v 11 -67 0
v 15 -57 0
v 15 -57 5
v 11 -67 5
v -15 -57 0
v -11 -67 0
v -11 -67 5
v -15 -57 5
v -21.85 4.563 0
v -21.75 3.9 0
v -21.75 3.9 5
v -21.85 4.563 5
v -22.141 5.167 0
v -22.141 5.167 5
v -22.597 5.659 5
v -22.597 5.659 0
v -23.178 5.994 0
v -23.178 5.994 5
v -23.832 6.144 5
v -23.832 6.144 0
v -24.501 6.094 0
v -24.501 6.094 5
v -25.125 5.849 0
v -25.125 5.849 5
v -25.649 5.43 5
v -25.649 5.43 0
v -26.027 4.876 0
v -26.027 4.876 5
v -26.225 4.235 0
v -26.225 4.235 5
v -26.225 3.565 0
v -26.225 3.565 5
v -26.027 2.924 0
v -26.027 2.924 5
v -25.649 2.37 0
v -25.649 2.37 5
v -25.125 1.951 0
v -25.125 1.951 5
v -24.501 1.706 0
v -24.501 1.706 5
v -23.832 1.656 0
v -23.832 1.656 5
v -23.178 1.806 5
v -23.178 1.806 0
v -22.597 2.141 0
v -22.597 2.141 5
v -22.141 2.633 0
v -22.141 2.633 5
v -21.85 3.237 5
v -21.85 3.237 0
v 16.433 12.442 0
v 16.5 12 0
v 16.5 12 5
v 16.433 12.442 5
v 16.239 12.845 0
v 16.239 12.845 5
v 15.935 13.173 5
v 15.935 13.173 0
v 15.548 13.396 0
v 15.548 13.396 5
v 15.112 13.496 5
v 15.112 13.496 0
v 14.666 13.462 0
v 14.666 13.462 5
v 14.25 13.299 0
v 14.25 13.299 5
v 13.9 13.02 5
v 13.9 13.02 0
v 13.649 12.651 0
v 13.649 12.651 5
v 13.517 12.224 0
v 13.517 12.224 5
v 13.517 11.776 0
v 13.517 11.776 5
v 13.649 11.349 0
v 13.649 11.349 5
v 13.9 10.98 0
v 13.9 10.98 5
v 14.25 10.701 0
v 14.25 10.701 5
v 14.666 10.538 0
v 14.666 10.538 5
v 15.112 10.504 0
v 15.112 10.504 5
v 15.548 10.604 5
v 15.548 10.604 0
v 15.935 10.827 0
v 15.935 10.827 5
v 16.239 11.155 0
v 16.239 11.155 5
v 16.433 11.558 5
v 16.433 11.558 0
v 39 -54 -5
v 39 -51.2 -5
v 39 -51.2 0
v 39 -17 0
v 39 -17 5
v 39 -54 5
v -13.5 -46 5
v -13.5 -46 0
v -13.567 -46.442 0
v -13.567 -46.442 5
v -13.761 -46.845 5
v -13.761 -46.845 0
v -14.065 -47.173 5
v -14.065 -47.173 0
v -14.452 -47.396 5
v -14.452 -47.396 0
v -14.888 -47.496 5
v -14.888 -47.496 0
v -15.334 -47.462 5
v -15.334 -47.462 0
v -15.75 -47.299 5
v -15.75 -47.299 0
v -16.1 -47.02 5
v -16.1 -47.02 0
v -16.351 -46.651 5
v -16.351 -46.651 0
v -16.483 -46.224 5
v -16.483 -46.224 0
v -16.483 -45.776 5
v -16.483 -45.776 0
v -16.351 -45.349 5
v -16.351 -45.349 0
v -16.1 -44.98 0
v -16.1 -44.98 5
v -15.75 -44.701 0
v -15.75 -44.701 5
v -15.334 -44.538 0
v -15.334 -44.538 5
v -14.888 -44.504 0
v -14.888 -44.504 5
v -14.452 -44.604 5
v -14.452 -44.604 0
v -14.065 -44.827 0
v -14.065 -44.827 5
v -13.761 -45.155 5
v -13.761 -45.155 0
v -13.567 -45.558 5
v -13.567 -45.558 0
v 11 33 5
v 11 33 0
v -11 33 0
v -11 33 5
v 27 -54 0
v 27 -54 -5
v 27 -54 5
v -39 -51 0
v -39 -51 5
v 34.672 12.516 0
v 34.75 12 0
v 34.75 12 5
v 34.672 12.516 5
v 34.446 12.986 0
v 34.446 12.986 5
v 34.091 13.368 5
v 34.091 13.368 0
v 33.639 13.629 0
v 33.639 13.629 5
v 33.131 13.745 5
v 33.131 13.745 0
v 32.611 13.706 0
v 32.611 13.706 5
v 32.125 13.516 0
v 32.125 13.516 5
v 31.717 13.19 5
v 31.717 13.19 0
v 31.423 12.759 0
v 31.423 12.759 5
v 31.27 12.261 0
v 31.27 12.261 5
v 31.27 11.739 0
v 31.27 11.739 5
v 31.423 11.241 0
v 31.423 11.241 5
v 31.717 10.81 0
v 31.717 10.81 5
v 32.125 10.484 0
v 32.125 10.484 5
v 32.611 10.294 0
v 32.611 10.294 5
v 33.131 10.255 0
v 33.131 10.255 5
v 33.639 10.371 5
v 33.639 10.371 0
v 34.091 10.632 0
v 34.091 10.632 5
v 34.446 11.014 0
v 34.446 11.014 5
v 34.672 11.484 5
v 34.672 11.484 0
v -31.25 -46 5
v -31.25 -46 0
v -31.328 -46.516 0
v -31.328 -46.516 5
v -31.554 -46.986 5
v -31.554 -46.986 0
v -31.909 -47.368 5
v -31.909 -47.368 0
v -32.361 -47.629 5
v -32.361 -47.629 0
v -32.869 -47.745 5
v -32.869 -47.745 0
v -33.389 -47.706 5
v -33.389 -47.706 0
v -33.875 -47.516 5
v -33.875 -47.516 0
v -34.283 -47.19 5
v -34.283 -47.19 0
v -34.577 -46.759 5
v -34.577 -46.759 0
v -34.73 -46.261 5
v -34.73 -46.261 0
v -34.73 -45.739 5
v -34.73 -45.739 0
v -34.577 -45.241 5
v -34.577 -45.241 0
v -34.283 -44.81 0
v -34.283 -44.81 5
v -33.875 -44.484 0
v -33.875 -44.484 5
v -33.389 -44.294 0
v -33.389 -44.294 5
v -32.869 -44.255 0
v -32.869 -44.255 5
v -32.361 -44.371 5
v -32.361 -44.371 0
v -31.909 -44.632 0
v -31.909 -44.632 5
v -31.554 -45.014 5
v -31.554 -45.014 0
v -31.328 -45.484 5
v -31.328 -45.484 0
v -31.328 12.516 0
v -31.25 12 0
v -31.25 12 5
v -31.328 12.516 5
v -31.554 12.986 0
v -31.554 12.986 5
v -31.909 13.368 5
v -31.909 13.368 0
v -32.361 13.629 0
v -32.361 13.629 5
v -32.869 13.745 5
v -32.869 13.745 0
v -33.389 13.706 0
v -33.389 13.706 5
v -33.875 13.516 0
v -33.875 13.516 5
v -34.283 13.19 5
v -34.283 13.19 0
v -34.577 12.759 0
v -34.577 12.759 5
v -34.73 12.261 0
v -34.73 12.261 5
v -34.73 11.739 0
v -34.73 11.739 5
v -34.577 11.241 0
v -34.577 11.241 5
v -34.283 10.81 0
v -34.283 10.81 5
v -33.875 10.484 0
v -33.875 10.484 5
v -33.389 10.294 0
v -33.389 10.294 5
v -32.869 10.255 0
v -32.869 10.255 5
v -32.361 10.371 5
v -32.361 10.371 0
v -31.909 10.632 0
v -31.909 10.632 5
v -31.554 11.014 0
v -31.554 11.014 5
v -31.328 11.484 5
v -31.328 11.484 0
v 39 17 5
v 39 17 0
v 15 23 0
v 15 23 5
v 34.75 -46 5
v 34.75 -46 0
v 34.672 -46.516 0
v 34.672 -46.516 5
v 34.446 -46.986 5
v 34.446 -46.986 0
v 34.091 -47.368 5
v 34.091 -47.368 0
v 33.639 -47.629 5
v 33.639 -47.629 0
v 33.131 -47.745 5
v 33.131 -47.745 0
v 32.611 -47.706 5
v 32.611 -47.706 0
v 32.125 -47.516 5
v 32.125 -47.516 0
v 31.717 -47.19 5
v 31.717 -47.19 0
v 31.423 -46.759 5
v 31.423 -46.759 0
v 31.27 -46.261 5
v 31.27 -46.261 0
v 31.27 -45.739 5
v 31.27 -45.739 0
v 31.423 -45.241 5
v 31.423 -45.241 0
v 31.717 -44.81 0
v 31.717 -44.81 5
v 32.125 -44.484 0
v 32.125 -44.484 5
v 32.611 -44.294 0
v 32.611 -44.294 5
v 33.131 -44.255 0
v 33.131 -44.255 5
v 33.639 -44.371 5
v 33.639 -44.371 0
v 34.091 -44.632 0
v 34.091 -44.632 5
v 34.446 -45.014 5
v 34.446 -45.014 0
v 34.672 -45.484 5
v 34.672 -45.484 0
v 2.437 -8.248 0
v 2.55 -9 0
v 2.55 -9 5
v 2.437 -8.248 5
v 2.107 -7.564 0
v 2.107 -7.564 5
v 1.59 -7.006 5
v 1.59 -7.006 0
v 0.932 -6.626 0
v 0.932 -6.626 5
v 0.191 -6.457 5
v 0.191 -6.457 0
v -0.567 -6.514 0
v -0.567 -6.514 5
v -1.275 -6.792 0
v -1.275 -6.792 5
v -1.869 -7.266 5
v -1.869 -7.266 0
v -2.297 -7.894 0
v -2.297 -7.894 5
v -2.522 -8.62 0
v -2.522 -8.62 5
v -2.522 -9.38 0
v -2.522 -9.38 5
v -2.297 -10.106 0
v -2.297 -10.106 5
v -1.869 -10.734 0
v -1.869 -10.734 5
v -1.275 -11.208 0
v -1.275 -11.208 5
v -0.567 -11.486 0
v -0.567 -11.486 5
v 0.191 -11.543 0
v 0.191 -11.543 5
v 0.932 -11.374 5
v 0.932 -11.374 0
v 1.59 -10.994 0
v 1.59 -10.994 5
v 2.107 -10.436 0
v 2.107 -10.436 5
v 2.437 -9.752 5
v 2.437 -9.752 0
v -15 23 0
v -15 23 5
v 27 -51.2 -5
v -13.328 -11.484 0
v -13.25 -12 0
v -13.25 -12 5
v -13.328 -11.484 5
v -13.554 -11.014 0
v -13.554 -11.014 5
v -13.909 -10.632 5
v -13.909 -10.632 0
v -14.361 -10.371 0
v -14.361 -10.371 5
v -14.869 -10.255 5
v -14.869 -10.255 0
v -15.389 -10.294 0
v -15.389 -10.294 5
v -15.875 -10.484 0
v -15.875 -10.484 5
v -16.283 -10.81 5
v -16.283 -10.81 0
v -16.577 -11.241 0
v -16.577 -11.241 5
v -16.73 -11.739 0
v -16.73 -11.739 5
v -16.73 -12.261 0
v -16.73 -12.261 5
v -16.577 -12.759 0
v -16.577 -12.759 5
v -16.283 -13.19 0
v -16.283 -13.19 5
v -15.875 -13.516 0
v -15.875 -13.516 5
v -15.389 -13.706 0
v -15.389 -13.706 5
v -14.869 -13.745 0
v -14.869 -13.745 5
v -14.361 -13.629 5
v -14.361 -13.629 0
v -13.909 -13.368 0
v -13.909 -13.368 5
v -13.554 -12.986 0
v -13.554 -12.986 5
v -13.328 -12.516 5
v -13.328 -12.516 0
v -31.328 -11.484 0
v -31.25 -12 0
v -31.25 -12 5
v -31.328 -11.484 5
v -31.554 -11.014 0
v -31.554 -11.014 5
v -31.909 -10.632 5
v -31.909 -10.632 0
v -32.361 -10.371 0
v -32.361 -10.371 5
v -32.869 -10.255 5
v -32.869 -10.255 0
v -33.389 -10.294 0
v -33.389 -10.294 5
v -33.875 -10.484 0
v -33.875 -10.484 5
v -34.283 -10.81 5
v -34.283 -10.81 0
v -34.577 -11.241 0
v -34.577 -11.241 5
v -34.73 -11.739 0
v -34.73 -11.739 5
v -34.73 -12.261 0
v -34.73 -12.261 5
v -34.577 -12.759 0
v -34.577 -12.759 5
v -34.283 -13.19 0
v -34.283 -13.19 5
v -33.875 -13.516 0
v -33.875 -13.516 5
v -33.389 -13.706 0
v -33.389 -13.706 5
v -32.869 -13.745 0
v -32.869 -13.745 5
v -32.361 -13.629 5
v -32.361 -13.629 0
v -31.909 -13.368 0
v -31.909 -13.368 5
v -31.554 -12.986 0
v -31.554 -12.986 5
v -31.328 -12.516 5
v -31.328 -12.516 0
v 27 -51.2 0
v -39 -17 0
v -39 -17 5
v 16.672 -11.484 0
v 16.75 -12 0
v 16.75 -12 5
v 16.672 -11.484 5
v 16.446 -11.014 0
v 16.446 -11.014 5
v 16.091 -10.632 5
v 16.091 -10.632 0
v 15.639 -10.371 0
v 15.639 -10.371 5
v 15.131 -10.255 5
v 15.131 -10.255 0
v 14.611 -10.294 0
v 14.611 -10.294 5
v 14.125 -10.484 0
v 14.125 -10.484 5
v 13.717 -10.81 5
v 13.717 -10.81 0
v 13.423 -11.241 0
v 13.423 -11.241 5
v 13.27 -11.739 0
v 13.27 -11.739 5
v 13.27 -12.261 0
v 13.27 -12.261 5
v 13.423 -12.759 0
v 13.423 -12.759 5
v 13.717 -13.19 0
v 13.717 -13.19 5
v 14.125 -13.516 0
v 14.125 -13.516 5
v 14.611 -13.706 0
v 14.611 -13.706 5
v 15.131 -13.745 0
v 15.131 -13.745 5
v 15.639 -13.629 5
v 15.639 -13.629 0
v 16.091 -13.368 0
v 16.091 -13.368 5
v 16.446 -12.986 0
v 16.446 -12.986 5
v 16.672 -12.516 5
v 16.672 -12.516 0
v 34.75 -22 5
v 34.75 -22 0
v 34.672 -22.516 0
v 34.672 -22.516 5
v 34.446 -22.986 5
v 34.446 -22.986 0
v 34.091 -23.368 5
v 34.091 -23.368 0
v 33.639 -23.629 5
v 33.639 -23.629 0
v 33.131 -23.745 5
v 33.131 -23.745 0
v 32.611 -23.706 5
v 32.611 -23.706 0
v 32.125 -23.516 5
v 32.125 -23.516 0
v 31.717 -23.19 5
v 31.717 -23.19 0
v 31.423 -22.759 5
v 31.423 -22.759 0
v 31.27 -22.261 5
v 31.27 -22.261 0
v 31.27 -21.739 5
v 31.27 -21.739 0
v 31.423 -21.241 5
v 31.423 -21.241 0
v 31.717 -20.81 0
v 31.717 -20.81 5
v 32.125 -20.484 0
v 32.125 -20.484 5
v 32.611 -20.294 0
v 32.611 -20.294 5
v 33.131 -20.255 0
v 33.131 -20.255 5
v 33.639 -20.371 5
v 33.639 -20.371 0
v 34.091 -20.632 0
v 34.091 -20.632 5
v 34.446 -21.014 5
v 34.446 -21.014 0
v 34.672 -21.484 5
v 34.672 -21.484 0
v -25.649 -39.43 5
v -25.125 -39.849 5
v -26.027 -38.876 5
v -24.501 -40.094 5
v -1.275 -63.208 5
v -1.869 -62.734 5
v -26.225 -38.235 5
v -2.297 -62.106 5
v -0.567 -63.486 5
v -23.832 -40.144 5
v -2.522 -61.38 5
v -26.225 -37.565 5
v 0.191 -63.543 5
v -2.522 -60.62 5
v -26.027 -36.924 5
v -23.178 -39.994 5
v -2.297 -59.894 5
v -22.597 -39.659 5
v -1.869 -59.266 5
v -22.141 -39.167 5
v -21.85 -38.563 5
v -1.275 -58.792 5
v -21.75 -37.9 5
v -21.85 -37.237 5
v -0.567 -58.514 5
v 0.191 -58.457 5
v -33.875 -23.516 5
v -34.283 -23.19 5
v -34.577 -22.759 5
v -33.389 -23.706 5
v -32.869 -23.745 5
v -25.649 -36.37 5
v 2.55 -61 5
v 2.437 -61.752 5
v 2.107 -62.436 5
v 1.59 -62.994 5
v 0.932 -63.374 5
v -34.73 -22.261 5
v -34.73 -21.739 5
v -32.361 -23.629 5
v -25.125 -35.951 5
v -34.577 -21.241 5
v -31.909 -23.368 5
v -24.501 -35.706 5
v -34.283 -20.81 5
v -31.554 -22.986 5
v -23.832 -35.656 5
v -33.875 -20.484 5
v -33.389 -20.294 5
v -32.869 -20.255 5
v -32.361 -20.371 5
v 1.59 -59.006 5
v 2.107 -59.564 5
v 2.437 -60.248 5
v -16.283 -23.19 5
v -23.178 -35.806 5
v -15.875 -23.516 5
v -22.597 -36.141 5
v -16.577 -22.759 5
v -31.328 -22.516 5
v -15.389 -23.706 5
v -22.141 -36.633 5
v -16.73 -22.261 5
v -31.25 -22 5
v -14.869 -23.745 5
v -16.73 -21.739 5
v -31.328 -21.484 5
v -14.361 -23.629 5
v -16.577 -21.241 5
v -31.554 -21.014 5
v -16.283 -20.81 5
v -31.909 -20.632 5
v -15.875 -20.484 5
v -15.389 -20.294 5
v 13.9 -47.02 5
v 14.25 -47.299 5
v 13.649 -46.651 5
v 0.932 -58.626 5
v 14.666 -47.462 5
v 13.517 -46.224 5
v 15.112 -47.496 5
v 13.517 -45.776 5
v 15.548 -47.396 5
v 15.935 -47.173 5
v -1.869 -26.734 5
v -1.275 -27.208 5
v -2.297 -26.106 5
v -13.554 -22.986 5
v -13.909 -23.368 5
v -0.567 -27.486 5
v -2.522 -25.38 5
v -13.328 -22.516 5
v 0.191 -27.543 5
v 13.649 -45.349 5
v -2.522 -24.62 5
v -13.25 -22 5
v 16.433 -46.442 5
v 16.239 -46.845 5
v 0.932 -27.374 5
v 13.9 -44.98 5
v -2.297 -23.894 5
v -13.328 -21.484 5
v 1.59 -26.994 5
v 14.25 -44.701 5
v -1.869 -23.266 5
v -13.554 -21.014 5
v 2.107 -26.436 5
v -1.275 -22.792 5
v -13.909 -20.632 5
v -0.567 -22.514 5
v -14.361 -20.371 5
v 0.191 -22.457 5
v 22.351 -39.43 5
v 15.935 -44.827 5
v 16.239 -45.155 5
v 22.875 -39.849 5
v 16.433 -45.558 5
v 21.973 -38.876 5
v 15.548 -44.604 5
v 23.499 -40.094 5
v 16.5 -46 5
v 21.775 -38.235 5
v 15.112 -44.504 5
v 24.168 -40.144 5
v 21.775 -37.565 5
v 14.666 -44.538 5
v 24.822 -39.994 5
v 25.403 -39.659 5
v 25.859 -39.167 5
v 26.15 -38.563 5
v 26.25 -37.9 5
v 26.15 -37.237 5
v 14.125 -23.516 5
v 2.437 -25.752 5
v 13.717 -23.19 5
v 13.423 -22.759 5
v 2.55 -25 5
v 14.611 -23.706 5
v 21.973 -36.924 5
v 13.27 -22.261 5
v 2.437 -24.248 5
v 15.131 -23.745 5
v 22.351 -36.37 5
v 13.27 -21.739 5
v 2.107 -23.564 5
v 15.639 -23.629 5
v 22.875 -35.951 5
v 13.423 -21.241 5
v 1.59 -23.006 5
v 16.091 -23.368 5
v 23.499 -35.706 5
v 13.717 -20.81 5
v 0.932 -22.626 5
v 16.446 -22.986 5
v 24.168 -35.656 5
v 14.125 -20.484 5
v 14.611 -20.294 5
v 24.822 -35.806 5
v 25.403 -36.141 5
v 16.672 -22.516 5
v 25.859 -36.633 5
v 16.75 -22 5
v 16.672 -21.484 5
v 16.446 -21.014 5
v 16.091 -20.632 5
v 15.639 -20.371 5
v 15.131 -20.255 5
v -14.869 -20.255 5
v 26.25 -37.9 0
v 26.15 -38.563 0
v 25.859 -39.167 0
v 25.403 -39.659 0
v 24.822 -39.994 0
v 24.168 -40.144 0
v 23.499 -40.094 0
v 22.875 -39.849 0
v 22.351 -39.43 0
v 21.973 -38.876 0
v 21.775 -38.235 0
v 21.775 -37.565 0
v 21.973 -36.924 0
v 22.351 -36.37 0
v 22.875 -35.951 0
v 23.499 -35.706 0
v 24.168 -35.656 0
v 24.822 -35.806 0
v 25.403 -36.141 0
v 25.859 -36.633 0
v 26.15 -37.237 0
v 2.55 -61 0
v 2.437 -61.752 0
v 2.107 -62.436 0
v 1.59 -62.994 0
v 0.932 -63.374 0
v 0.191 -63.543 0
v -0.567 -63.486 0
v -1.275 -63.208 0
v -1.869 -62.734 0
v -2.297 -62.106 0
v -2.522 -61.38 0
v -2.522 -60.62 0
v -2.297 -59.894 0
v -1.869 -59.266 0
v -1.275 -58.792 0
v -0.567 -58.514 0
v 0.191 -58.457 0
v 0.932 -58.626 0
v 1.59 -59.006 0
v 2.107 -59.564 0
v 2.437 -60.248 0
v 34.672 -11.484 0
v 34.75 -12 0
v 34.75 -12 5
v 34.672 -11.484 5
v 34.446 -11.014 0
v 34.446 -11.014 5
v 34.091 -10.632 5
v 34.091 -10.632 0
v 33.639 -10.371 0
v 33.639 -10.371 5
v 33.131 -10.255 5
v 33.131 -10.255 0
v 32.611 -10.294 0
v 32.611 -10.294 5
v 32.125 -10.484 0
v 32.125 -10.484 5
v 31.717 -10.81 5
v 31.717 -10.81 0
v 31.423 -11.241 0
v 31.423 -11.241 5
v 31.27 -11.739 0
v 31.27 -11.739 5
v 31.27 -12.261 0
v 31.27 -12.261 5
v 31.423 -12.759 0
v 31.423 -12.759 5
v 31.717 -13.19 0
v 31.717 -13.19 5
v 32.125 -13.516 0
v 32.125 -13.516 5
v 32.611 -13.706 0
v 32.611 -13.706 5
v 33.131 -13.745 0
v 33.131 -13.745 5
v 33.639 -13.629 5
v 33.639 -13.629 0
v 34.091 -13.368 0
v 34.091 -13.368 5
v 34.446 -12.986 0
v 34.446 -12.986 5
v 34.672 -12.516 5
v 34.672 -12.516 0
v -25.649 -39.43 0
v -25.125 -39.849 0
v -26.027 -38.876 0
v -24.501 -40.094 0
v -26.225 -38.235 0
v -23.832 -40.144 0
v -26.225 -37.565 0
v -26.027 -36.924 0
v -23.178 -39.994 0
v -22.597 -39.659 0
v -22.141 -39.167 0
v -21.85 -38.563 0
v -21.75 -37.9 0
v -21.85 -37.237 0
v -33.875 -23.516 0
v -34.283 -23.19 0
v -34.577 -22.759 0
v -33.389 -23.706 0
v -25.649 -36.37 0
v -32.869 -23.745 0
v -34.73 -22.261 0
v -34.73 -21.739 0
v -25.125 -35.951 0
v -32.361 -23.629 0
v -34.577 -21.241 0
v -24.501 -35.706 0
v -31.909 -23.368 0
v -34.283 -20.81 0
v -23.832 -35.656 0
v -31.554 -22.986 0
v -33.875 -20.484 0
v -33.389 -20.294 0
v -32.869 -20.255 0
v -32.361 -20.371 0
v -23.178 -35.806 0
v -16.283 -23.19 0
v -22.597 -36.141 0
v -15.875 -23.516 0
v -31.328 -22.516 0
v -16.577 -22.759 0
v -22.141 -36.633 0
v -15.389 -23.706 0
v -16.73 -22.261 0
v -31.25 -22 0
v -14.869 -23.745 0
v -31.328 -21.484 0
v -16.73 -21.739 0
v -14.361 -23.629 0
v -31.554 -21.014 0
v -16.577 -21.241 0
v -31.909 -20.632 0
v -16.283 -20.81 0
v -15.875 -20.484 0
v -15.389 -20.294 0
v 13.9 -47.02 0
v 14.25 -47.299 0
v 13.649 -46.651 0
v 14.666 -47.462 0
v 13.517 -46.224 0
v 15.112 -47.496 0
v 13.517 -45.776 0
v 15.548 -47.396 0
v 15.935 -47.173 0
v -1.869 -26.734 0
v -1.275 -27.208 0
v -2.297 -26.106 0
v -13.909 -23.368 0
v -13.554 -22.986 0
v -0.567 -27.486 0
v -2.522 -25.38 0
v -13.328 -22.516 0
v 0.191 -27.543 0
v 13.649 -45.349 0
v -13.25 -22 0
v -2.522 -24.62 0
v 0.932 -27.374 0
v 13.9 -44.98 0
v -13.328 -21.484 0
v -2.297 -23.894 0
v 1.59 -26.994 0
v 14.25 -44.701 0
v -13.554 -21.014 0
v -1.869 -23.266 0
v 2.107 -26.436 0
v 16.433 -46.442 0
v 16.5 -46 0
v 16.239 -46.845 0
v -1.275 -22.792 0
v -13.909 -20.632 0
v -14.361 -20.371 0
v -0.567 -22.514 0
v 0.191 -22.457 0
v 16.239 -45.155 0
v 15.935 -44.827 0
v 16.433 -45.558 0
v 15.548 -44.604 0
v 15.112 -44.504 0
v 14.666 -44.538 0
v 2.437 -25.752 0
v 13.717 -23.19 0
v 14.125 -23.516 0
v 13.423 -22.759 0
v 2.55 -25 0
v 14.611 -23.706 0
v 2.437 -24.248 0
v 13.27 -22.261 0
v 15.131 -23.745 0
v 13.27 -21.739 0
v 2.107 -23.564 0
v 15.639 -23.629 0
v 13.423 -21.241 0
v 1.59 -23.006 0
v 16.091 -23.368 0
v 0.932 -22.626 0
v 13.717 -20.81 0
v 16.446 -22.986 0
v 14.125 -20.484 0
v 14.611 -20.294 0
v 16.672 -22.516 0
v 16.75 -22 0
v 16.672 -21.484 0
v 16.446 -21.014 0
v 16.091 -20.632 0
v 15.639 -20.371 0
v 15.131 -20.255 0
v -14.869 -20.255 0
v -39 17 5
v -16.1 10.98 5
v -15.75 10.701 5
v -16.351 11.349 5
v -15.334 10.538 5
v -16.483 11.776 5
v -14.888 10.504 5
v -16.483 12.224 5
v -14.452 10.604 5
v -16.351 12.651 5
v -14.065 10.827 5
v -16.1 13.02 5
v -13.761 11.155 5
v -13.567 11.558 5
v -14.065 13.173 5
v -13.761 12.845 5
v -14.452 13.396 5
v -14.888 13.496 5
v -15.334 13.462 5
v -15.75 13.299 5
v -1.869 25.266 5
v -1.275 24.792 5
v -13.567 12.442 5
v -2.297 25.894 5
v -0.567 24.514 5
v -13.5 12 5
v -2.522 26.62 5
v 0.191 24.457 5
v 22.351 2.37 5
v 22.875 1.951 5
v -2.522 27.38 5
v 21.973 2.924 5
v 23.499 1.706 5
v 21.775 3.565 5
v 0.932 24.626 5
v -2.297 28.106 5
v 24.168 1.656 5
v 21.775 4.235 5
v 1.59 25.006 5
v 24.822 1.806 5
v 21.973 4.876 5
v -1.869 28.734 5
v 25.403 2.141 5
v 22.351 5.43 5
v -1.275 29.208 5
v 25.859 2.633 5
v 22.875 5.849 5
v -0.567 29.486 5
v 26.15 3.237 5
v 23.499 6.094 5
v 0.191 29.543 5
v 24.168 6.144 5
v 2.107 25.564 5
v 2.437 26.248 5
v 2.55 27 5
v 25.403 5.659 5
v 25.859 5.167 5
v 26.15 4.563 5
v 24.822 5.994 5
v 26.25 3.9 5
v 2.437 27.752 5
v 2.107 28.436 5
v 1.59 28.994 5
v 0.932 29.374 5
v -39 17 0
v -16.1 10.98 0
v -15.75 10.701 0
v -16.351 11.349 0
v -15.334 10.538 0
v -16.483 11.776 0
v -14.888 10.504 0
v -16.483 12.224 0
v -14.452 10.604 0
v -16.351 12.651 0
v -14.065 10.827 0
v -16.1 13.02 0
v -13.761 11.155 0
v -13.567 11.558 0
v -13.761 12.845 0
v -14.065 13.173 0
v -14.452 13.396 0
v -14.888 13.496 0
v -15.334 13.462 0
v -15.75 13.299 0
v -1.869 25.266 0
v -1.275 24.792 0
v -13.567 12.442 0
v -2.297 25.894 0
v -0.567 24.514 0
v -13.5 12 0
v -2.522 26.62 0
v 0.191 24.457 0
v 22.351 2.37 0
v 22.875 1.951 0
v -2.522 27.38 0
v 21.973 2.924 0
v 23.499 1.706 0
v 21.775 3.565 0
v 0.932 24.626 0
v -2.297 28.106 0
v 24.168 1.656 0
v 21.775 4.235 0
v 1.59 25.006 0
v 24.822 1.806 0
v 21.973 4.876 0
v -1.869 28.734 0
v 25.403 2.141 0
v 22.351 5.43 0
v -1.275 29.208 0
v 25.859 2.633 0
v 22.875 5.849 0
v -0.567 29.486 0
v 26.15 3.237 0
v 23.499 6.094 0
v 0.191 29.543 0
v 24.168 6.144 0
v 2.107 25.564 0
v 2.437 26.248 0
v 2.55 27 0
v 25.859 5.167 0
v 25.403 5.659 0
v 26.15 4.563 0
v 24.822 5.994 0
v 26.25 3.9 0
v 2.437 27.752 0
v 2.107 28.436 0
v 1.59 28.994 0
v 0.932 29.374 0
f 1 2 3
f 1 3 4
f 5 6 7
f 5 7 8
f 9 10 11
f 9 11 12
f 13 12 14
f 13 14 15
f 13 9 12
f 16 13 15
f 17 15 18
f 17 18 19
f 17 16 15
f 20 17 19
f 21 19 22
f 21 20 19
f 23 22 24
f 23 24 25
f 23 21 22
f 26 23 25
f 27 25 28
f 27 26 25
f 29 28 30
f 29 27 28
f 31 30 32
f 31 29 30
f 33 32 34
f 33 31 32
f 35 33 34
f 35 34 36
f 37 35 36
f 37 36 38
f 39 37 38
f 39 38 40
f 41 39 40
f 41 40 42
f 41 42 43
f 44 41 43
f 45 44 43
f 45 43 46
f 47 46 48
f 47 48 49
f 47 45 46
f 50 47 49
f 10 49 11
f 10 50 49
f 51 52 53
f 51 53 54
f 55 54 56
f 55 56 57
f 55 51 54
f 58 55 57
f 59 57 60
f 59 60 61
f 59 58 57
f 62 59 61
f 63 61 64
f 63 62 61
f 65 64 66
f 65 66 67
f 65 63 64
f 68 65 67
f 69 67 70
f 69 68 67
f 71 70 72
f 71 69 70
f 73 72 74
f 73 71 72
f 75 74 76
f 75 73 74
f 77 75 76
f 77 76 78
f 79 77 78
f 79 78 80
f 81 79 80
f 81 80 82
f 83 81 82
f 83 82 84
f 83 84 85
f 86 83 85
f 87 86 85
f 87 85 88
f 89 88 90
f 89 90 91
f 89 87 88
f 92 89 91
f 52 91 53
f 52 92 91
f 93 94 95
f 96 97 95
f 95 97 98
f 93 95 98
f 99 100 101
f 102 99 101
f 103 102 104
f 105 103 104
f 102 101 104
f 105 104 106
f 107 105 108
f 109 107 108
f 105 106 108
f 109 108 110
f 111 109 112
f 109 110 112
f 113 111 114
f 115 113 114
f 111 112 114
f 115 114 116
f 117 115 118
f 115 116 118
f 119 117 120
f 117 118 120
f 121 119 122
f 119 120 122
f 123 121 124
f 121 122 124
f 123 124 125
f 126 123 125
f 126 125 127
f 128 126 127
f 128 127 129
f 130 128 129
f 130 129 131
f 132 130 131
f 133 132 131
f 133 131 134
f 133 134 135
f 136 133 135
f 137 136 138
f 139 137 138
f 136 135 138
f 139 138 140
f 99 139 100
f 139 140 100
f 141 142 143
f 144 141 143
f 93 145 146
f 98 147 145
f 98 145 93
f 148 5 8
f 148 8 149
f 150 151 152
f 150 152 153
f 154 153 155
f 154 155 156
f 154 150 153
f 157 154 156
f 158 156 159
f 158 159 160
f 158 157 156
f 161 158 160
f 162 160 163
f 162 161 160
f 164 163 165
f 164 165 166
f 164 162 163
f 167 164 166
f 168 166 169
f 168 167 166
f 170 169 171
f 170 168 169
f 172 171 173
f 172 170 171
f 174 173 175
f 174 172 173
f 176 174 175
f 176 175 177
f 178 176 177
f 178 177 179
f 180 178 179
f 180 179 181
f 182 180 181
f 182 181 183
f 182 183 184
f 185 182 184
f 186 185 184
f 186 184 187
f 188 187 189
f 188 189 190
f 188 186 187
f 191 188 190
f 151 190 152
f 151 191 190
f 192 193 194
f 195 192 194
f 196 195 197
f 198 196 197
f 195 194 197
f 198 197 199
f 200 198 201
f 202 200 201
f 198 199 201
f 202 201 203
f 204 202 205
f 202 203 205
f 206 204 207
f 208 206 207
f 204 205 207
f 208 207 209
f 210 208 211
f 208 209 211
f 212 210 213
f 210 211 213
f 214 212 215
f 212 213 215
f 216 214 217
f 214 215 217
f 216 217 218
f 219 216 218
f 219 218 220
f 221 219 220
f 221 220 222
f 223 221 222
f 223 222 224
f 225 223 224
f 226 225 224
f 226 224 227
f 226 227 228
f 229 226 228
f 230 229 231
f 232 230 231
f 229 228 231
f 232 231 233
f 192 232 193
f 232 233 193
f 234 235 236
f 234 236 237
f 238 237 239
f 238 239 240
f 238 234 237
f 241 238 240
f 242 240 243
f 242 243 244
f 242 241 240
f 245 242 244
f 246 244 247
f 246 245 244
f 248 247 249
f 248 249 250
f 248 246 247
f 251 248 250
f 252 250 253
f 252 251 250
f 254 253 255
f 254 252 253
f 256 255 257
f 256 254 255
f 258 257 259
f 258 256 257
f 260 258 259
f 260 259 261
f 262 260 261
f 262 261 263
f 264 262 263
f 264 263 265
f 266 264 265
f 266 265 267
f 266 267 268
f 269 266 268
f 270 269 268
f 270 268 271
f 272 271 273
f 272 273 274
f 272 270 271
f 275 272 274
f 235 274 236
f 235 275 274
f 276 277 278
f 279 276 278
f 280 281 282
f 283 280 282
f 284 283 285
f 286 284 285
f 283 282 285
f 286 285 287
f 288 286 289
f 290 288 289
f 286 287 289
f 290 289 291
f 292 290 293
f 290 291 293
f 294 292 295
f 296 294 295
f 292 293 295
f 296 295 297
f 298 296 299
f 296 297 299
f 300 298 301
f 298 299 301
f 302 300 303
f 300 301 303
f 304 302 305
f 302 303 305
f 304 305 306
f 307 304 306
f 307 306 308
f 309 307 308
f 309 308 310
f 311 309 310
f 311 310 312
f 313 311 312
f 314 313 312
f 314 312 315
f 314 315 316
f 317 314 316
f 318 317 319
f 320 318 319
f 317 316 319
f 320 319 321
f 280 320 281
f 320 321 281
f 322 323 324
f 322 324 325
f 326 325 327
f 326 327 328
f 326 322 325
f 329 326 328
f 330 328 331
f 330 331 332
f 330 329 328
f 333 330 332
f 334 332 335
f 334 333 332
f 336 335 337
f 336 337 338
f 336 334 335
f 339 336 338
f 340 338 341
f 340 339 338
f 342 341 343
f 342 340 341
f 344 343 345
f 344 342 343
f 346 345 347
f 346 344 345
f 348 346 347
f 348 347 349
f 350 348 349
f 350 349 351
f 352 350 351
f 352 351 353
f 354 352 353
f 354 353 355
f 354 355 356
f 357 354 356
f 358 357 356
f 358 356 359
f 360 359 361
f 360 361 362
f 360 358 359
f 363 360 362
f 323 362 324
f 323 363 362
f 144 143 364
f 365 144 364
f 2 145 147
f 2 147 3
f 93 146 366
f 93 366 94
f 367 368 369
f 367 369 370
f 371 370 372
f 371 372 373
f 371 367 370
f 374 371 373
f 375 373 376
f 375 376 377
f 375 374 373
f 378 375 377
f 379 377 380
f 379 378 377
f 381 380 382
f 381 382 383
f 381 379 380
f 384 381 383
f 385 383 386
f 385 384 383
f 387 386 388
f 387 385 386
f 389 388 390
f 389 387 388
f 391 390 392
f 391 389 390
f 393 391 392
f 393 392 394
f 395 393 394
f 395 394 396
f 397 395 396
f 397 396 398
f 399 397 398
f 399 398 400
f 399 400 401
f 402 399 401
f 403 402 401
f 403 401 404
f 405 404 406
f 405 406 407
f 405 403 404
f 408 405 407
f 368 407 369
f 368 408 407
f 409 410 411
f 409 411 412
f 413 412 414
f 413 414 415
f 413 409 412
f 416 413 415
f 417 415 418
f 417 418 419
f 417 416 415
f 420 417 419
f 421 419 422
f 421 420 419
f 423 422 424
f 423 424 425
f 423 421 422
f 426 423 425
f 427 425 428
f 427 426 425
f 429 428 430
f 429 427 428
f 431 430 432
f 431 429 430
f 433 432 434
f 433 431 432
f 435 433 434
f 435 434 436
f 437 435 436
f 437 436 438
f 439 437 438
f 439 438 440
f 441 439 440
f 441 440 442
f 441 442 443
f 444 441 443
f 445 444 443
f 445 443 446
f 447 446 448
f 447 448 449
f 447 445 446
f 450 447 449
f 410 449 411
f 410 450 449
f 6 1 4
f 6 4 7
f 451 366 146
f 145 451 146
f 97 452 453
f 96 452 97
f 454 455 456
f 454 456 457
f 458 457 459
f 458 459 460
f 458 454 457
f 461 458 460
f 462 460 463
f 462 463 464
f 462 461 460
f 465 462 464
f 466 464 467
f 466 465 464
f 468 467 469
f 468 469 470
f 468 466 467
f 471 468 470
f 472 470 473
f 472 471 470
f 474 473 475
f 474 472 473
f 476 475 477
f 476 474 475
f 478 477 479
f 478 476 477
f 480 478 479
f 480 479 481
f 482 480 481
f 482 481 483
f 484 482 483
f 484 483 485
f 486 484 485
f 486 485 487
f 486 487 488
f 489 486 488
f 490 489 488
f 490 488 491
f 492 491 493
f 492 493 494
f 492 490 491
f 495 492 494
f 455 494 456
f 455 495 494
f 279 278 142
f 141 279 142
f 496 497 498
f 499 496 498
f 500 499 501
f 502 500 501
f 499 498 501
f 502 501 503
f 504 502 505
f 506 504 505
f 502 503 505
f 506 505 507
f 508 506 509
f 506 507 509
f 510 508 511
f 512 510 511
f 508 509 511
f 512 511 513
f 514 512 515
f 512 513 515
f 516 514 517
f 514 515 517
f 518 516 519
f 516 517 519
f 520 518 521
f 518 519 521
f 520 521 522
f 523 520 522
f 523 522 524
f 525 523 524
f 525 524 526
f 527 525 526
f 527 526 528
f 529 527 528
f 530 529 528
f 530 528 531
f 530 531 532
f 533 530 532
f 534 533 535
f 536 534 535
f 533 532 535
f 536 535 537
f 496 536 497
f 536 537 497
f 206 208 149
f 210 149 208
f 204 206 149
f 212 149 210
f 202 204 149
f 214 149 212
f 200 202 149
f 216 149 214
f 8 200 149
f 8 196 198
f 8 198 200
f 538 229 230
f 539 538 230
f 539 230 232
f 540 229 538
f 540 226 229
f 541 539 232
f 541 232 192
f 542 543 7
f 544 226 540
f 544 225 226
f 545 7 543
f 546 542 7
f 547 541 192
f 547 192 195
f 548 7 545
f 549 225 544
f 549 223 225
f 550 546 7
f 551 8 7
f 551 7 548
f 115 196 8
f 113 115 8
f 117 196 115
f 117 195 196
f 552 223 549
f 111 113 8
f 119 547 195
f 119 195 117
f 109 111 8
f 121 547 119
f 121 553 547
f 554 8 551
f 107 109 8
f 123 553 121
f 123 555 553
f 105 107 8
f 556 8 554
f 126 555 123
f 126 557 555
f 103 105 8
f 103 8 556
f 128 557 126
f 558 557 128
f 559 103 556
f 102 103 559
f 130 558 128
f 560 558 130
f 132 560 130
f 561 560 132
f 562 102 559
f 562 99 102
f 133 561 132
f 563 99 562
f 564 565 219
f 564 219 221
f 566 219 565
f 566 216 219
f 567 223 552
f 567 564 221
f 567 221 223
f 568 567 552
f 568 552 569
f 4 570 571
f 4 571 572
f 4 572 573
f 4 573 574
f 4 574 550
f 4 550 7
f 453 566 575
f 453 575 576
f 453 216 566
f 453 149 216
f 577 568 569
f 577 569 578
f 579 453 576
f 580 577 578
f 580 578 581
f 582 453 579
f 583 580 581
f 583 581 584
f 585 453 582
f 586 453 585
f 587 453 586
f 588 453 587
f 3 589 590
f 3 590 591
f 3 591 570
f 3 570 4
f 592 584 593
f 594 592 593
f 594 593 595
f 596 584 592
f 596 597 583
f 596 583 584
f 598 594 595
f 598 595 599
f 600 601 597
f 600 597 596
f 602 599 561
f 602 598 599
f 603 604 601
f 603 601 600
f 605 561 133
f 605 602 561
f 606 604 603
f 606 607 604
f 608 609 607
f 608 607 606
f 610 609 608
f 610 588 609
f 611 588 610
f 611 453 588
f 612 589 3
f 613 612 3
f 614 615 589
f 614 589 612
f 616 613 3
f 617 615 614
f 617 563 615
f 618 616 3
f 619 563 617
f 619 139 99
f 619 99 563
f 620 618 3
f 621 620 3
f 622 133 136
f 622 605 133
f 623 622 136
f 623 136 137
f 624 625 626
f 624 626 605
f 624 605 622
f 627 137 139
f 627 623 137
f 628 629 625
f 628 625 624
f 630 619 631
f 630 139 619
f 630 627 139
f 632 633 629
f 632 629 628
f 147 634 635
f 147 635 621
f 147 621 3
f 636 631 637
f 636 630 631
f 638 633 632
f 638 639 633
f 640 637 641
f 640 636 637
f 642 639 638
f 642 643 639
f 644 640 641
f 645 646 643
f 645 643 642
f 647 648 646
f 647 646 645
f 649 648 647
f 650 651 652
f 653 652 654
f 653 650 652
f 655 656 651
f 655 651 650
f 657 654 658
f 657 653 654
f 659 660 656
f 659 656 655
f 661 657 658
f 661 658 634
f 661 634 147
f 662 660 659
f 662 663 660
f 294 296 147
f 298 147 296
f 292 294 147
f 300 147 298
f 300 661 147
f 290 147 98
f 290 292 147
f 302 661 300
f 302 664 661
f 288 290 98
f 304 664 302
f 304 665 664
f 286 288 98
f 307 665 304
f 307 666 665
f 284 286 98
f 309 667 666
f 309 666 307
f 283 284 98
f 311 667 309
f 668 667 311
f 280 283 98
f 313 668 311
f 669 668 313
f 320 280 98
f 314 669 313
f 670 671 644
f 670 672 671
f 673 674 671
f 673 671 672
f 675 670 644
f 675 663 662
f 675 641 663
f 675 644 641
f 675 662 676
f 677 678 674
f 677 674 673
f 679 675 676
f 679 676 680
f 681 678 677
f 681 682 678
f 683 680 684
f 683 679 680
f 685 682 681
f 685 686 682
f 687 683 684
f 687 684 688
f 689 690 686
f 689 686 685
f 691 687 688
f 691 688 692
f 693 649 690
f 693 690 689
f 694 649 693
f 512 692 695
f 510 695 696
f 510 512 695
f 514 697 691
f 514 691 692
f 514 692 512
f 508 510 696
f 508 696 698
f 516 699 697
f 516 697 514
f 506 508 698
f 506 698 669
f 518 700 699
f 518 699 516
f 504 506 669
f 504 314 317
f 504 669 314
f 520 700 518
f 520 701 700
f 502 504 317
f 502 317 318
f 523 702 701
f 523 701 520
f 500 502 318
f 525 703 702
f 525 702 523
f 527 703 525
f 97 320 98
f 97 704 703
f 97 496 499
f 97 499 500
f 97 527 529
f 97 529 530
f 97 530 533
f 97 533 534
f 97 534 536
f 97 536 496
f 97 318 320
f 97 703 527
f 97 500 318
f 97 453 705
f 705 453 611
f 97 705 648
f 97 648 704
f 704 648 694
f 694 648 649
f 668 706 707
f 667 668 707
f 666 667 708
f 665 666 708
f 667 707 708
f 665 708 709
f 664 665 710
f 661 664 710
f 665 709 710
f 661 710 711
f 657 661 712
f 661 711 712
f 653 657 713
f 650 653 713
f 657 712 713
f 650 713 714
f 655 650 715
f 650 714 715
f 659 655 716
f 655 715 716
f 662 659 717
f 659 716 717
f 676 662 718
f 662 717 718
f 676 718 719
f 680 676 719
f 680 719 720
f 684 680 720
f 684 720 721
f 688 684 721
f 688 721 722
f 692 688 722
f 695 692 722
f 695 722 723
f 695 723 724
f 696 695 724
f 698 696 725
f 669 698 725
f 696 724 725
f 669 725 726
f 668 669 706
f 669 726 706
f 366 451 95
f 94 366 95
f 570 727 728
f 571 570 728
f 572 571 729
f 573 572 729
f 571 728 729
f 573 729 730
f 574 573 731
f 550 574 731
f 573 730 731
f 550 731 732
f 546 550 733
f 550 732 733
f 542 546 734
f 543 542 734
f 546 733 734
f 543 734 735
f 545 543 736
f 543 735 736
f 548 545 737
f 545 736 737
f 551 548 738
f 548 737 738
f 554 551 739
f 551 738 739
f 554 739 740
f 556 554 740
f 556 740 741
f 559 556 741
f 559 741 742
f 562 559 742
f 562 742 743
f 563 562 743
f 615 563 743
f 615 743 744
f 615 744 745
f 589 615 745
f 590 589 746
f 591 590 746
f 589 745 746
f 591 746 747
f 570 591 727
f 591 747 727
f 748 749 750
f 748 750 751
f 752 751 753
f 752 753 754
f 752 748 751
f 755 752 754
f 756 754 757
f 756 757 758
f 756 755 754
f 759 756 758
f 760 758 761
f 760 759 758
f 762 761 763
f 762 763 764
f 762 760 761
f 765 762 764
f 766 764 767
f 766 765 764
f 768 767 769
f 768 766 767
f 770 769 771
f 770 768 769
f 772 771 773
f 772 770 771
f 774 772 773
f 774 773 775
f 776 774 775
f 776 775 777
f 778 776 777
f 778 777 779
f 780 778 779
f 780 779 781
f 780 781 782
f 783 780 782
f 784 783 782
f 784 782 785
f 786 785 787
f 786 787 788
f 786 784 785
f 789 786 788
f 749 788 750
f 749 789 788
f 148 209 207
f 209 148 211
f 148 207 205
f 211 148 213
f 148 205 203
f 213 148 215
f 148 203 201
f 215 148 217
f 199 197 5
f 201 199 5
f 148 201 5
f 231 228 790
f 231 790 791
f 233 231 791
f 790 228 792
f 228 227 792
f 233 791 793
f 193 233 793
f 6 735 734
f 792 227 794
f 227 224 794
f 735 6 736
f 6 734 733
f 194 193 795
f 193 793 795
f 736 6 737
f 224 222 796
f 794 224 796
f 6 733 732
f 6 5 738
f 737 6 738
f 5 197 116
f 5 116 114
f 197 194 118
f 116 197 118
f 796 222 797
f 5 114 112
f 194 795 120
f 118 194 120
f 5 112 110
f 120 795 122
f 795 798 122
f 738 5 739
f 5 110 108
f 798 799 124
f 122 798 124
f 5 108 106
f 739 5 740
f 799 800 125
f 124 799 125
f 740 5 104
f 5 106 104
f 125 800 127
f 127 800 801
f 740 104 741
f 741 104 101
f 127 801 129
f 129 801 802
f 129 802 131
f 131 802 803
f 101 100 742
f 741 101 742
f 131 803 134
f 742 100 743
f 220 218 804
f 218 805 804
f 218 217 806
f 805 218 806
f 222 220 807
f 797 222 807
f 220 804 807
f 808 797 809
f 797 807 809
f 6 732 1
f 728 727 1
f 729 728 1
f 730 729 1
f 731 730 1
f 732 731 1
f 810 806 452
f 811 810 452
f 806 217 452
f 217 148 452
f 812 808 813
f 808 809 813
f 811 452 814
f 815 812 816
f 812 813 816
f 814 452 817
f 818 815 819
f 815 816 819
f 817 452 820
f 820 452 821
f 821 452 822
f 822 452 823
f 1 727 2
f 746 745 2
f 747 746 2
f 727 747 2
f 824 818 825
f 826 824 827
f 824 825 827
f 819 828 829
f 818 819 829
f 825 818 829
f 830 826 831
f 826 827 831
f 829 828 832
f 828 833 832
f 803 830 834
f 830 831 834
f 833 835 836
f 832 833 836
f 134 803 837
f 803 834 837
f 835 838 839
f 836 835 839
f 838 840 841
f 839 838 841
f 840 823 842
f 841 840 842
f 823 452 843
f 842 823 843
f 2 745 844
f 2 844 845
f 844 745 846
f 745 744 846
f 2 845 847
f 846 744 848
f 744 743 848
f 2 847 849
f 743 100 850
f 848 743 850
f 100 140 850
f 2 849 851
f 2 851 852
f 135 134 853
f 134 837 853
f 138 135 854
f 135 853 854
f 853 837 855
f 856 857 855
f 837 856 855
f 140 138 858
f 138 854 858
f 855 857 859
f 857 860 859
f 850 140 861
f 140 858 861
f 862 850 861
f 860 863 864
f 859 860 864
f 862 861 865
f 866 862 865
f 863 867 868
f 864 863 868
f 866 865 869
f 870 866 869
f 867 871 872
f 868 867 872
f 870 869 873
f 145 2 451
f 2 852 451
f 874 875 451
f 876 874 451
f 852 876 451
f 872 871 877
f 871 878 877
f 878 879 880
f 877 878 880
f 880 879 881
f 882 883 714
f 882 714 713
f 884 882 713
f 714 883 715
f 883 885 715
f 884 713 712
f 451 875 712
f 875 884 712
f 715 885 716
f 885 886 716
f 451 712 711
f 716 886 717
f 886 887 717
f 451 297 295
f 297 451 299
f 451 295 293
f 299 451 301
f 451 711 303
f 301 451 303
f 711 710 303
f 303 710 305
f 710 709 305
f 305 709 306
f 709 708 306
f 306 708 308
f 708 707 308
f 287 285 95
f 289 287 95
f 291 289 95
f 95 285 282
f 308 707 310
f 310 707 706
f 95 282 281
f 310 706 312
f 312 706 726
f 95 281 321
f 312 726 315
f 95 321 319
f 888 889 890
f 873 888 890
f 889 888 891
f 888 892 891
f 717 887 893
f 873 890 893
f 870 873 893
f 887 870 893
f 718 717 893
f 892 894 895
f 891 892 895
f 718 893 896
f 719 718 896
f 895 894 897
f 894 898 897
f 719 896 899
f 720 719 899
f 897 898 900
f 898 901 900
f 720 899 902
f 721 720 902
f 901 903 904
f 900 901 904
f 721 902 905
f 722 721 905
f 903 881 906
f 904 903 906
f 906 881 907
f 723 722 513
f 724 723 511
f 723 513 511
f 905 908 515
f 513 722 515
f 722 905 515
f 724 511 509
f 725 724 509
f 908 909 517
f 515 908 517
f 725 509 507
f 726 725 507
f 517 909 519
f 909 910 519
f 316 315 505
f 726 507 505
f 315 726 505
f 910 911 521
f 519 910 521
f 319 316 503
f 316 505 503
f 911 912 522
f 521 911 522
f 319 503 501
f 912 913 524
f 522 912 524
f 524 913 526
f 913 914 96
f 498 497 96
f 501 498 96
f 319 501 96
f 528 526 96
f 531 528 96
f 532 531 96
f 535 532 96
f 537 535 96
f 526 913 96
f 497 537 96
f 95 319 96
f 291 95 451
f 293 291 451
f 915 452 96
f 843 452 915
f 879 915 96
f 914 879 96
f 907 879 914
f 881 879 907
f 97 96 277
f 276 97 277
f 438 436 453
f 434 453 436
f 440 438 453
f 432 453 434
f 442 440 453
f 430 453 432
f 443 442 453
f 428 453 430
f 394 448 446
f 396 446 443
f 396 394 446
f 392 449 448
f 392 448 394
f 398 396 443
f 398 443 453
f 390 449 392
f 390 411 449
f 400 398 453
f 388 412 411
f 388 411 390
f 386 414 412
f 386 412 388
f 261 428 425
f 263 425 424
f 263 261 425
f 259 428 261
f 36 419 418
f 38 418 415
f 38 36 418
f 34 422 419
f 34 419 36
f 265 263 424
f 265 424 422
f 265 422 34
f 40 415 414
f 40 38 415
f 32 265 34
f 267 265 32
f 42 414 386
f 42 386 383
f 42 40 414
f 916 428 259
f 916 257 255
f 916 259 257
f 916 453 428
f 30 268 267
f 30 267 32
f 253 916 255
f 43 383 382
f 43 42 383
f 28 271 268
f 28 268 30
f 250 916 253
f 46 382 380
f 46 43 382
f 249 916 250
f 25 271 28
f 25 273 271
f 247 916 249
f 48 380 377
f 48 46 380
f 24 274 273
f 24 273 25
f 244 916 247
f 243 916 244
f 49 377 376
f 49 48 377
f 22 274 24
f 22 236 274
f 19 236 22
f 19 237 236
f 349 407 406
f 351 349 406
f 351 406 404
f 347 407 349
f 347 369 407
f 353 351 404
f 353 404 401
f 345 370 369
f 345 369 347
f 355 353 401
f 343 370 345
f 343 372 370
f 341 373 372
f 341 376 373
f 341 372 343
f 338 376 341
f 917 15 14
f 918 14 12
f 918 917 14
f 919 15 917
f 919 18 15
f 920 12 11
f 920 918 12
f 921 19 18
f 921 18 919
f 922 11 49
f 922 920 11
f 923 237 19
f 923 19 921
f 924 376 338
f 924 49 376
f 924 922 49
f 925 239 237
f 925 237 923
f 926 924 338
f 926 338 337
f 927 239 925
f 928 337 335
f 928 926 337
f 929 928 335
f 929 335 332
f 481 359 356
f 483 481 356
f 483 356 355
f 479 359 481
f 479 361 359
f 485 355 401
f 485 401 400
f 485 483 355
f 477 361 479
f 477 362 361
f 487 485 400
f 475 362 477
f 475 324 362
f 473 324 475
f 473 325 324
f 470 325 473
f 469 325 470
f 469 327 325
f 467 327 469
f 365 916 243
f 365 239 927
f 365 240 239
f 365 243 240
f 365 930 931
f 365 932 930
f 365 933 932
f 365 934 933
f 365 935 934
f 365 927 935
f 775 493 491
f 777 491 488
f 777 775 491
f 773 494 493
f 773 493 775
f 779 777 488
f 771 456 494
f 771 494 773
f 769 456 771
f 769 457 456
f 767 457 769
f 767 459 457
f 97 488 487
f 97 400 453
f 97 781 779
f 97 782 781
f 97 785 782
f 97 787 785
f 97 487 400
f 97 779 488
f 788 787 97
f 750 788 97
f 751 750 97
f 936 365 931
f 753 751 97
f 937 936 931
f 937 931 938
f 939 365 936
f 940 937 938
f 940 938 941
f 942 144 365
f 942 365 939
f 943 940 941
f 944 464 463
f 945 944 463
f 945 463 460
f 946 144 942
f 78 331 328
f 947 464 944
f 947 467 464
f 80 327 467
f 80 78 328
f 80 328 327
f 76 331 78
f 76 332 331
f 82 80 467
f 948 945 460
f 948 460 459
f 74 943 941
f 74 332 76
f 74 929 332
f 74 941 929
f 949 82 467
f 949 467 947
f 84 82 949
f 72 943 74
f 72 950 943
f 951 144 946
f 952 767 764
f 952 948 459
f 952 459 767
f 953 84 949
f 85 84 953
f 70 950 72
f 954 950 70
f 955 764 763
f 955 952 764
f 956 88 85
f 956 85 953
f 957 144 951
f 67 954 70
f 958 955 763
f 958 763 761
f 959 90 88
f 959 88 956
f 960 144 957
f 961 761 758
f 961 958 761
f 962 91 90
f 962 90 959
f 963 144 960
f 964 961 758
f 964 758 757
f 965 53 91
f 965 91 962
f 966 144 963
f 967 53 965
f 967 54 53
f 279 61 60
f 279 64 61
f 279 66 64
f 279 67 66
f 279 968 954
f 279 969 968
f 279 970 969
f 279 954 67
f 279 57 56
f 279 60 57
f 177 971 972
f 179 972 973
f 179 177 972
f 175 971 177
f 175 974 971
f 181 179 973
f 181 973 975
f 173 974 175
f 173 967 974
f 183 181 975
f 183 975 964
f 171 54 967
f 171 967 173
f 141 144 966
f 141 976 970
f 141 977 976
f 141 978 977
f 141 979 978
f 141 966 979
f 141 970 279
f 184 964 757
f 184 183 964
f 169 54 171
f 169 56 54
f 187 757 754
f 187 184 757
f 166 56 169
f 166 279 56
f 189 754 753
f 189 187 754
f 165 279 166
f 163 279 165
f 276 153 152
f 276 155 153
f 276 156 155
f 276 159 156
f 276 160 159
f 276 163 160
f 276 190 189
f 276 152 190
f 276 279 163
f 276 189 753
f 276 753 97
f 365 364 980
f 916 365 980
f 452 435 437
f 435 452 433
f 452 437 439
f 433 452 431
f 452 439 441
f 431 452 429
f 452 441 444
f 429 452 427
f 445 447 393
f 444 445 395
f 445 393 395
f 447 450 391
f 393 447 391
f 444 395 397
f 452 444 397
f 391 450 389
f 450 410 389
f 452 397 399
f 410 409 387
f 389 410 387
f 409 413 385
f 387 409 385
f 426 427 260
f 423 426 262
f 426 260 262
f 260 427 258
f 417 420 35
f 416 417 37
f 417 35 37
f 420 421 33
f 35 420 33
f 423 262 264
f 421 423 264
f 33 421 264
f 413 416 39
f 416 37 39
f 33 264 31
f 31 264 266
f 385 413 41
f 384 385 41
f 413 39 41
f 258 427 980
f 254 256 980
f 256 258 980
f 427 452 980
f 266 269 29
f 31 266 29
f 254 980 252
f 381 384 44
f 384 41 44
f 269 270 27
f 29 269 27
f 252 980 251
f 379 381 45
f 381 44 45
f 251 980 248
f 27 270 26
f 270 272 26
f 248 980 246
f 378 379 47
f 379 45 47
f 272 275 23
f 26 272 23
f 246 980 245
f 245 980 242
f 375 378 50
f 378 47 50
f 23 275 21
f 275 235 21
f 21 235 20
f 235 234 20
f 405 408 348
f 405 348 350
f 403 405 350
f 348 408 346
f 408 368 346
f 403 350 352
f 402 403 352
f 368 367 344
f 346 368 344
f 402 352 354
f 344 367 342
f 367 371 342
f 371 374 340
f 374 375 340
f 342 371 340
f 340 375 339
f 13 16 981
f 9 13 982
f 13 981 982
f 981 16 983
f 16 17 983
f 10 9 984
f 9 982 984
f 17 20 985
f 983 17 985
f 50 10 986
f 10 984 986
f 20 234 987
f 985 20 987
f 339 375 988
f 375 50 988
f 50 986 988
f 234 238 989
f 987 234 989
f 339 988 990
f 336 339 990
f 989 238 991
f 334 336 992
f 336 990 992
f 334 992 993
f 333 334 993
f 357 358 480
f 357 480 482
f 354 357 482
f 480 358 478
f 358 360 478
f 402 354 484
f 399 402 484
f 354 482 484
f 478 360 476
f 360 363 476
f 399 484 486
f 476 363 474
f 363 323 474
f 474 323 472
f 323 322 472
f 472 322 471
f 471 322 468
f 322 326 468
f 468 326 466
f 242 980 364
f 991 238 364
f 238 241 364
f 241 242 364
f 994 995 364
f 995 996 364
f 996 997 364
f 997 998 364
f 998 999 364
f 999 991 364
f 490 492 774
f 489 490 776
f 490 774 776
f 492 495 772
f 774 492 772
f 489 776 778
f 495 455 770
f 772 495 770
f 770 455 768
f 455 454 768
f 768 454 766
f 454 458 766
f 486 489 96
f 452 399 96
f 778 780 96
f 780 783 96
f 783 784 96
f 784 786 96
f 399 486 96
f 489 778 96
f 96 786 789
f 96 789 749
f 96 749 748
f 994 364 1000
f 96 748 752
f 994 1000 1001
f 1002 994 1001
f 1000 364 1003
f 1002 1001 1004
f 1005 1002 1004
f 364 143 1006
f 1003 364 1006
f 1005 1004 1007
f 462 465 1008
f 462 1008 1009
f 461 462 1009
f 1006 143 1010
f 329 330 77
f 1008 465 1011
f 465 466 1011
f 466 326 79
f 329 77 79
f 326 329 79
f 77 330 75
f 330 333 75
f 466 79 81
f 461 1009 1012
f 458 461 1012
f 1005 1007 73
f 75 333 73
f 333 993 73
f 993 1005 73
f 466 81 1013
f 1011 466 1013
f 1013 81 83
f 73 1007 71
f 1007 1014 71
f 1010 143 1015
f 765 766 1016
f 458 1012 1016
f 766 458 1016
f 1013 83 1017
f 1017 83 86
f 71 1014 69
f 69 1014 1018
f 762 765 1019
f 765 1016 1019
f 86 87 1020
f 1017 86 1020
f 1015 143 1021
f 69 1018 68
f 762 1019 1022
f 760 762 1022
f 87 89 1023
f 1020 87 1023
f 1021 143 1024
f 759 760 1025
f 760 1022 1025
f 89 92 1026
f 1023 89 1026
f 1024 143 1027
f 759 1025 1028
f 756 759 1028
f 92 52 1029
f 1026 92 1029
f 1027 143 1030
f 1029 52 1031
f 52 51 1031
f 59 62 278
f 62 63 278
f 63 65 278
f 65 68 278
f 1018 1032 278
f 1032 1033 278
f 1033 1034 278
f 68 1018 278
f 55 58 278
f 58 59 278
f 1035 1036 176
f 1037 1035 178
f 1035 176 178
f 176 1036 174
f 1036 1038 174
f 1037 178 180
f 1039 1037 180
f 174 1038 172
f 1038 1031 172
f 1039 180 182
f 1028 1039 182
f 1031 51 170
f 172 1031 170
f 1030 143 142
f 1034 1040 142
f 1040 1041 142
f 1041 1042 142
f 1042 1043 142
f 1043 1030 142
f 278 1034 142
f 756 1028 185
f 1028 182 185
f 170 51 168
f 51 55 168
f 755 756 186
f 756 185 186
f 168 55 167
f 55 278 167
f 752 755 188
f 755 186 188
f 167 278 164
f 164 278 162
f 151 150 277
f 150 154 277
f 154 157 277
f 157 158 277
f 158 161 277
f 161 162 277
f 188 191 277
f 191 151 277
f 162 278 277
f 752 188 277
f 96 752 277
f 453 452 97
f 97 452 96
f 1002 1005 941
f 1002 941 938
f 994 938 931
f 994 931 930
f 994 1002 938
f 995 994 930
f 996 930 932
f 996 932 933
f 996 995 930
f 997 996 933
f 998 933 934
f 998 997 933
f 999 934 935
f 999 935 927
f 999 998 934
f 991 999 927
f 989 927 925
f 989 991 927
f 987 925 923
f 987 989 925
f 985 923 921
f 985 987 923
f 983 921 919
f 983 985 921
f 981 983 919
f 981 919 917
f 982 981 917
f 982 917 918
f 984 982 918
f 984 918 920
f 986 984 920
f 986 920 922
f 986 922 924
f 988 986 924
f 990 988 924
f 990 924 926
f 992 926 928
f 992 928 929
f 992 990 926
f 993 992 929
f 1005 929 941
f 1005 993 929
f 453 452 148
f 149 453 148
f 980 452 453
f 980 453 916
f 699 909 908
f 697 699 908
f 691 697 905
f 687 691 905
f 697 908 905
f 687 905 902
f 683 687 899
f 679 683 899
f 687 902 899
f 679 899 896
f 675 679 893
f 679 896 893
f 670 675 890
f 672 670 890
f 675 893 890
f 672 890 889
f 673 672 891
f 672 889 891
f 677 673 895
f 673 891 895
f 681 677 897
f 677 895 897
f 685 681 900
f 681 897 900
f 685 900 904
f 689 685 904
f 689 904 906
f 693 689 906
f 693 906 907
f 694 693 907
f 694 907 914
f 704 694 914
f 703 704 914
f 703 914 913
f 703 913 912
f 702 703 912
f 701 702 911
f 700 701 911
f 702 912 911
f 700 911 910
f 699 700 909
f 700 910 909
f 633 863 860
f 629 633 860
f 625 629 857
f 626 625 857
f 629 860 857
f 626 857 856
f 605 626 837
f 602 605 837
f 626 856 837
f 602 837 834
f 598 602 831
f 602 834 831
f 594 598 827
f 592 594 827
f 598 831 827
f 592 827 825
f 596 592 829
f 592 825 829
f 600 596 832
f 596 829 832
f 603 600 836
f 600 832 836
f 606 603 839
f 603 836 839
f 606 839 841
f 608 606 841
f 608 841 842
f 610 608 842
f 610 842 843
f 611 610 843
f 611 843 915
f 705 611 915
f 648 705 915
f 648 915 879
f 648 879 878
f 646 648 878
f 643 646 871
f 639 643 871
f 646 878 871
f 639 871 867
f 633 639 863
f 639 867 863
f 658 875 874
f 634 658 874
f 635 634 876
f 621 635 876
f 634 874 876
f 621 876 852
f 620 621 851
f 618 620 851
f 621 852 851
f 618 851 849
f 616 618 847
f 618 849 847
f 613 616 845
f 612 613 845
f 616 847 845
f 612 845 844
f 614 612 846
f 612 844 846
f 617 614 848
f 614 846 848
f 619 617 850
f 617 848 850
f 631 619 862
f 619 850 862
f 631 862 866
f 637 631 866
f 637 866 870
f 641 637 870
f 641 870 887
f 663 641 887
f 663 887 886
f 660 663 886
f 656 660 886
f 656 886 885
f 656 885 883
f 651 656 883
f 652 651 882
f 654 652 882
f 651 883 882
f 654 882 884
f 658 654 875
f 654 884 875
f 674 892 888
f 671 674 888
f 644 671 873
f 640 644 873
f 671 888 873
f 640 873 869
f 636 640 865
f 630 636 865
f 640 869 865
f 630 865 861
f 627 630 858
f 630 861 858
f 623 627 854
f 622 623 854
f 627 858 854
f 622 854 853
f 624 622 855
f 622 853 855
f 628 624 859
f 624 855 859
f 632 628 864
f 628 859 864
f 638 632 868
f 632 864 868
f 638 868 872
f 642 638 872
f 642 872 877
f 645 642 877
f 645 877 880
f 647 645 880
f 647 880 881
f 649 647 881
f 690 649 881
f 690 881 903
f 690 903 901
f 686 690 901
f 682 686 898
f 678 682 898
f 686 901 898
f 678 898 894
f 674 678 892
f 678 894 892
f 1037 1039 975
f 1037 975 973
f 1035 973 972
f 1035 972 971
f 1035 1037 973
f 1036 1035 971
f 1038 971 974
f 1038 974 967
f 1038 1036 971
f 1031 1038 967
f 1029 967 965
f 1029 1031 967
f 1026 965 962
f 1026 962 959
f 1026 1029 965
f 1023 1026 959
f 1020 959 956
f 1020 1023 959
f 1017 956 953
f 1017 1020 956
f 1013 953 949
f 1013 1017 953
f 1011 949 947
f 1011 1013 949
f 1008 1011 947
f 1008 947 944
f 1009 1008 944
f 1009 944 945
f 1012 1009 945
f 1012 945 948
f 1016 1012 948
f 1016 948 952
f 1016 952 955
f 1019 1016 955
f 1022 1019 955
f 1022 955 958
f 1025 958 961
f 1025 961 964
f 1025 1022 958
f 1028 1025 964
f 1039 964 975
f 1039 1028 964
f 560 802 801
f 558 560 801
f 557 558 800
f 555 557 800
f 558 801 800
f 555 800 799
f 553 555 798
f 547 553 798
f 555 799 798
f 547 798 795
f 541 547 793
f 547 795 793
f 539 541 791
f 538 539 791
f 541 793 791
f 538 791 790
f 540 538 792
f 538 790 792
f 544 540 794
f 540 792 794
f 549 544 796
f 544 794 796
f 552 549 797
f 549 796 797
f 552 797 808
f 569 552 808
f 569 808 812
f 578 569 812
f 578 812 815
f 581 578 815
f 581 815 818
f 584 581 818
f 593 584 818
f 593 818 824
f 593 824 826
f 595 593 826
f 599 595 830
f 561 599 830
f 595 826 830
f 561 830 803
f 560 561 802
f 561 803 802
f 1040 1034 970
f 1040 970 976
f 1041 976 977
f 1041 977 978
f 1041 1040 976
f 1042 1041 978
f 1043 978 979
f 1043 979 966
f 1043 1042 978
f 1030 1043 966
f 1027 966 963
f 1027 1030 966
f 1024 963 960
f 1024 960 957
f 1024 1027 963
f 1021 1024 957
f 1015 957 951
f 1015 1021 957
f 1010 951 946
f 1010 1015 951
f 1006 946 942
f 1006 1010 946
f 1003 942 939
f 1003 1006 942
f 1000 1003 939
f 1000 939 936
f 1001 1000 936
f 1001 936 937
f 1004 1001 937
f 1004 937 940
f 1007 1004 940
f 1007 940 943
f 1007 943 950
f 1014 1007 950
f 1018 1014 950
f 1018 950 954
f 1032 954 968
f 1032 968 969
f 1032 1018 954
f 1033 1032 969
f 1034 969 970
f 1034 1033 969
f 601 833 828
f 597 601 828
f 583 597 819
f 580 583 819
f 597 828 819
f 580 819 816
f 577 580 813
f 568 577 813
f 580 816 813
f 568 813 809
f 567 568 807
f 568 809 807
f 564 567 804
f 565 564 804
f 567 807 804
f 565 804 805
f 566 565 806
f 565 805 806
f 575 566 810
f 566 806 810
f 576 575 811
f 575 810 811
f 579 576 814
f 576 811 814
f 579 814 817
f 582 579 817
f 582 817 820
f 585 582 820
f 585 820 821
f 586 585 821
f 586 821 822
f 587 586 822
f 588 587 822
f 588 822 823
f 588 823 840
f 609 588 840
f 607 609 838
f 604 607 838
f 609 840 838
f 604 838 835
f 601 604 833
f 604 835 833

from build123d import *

# Parameters (mm, degrees)
F0_W     = 78
F0_H     = 34
F0_R     = 1.75
F0_R_2   = 2.25
F0_R_3   = 2.55
F0_R_4   = 1.5
F1_DEPTH = 5
F4_DEPTH = 5
F5_W     = 12
F5_H     = 2.8
F6_DEPTH = 5


with BuildPart() as f1:
    # F0 (on Top) → F1 (new body)
    with BuildSketch(Plane.XY):
        Rectangle(F0_W, F0_H)
        with Locations((-33, -12)):
            Circle(F0_R, mode=Mode.SUBTRACT)
        with Locations((-15, -12)):
            Circle(F0_R, mode=Mode.SUBTRACT)
        with Locations((-24, 3.9)):
            Circle(F0_R_2, mode=Mode.SUBTRACT)
        with Locations((15, -12)):
            Circle(F0_R, mode=Mode.SUBTRACT)
        with Locations((0, -9)):
            Circle(F0_R_3, mode=Mode.SUBTRACT)
        with Locations((33, -12)):
            Circle(F0_R, mode=Mode.SUBTRACT)
        with Locations((24, 3.9)):
            Circle(F0_R_2, mode=Mode.SUBTRACT)
        with Locations((-33, 12)):
            Circle(F0_R, mode=Mode.SUBTRACT)
        with Locations((-15, 12)):
            Circle(F0_R_4, mode=Mode.SUBTRACT)
        with Locations((15, 12)):
            Circle(F0_R_4, mode=Mode.SUBTRACT)
        with Locations((33, 12)):
            Circle(F0_R, mode=Mode.SUBTRACT)
        Polygon((-39, 17), (39, 17), (15, 23), (11, 33), (-11, 33), (-15, 23), align=None)
        with Locations((0, 27)):
            Circle(F0_R_3, mode=Mode.SUBTRACT)
    extrude(amount=F1_DEPTH)


with BuildPart() as f2_1:
    # F2: instance of F1
    add(f1.part.mirror(Plane(origin=(0, -17, 2.5), x_dir=(1, 0, 0), z_dir=(0, -1, 0))))

    # F3 (on face) → F4 (join, through all)
    with BuildSketch(Plane.XY.offset(5)):
        Polygon((39, -51), (27, -54), (39, -54), align=None)
    extrude(amount=-F4_DEPTH)

    # F5 (on face) → F6 (join)
    with BuildSketch(Plane(origin=(0, 0, 0), x_dir=(1, 0, 0), z_dir=(0, 0, -1))):
        with Locations((33, 52.6)):
            Rectangle(F5_W, F5_H)
    extrude(amount=F6_DEPTH)


solid = Compound([f1.part, f2_1.part])
